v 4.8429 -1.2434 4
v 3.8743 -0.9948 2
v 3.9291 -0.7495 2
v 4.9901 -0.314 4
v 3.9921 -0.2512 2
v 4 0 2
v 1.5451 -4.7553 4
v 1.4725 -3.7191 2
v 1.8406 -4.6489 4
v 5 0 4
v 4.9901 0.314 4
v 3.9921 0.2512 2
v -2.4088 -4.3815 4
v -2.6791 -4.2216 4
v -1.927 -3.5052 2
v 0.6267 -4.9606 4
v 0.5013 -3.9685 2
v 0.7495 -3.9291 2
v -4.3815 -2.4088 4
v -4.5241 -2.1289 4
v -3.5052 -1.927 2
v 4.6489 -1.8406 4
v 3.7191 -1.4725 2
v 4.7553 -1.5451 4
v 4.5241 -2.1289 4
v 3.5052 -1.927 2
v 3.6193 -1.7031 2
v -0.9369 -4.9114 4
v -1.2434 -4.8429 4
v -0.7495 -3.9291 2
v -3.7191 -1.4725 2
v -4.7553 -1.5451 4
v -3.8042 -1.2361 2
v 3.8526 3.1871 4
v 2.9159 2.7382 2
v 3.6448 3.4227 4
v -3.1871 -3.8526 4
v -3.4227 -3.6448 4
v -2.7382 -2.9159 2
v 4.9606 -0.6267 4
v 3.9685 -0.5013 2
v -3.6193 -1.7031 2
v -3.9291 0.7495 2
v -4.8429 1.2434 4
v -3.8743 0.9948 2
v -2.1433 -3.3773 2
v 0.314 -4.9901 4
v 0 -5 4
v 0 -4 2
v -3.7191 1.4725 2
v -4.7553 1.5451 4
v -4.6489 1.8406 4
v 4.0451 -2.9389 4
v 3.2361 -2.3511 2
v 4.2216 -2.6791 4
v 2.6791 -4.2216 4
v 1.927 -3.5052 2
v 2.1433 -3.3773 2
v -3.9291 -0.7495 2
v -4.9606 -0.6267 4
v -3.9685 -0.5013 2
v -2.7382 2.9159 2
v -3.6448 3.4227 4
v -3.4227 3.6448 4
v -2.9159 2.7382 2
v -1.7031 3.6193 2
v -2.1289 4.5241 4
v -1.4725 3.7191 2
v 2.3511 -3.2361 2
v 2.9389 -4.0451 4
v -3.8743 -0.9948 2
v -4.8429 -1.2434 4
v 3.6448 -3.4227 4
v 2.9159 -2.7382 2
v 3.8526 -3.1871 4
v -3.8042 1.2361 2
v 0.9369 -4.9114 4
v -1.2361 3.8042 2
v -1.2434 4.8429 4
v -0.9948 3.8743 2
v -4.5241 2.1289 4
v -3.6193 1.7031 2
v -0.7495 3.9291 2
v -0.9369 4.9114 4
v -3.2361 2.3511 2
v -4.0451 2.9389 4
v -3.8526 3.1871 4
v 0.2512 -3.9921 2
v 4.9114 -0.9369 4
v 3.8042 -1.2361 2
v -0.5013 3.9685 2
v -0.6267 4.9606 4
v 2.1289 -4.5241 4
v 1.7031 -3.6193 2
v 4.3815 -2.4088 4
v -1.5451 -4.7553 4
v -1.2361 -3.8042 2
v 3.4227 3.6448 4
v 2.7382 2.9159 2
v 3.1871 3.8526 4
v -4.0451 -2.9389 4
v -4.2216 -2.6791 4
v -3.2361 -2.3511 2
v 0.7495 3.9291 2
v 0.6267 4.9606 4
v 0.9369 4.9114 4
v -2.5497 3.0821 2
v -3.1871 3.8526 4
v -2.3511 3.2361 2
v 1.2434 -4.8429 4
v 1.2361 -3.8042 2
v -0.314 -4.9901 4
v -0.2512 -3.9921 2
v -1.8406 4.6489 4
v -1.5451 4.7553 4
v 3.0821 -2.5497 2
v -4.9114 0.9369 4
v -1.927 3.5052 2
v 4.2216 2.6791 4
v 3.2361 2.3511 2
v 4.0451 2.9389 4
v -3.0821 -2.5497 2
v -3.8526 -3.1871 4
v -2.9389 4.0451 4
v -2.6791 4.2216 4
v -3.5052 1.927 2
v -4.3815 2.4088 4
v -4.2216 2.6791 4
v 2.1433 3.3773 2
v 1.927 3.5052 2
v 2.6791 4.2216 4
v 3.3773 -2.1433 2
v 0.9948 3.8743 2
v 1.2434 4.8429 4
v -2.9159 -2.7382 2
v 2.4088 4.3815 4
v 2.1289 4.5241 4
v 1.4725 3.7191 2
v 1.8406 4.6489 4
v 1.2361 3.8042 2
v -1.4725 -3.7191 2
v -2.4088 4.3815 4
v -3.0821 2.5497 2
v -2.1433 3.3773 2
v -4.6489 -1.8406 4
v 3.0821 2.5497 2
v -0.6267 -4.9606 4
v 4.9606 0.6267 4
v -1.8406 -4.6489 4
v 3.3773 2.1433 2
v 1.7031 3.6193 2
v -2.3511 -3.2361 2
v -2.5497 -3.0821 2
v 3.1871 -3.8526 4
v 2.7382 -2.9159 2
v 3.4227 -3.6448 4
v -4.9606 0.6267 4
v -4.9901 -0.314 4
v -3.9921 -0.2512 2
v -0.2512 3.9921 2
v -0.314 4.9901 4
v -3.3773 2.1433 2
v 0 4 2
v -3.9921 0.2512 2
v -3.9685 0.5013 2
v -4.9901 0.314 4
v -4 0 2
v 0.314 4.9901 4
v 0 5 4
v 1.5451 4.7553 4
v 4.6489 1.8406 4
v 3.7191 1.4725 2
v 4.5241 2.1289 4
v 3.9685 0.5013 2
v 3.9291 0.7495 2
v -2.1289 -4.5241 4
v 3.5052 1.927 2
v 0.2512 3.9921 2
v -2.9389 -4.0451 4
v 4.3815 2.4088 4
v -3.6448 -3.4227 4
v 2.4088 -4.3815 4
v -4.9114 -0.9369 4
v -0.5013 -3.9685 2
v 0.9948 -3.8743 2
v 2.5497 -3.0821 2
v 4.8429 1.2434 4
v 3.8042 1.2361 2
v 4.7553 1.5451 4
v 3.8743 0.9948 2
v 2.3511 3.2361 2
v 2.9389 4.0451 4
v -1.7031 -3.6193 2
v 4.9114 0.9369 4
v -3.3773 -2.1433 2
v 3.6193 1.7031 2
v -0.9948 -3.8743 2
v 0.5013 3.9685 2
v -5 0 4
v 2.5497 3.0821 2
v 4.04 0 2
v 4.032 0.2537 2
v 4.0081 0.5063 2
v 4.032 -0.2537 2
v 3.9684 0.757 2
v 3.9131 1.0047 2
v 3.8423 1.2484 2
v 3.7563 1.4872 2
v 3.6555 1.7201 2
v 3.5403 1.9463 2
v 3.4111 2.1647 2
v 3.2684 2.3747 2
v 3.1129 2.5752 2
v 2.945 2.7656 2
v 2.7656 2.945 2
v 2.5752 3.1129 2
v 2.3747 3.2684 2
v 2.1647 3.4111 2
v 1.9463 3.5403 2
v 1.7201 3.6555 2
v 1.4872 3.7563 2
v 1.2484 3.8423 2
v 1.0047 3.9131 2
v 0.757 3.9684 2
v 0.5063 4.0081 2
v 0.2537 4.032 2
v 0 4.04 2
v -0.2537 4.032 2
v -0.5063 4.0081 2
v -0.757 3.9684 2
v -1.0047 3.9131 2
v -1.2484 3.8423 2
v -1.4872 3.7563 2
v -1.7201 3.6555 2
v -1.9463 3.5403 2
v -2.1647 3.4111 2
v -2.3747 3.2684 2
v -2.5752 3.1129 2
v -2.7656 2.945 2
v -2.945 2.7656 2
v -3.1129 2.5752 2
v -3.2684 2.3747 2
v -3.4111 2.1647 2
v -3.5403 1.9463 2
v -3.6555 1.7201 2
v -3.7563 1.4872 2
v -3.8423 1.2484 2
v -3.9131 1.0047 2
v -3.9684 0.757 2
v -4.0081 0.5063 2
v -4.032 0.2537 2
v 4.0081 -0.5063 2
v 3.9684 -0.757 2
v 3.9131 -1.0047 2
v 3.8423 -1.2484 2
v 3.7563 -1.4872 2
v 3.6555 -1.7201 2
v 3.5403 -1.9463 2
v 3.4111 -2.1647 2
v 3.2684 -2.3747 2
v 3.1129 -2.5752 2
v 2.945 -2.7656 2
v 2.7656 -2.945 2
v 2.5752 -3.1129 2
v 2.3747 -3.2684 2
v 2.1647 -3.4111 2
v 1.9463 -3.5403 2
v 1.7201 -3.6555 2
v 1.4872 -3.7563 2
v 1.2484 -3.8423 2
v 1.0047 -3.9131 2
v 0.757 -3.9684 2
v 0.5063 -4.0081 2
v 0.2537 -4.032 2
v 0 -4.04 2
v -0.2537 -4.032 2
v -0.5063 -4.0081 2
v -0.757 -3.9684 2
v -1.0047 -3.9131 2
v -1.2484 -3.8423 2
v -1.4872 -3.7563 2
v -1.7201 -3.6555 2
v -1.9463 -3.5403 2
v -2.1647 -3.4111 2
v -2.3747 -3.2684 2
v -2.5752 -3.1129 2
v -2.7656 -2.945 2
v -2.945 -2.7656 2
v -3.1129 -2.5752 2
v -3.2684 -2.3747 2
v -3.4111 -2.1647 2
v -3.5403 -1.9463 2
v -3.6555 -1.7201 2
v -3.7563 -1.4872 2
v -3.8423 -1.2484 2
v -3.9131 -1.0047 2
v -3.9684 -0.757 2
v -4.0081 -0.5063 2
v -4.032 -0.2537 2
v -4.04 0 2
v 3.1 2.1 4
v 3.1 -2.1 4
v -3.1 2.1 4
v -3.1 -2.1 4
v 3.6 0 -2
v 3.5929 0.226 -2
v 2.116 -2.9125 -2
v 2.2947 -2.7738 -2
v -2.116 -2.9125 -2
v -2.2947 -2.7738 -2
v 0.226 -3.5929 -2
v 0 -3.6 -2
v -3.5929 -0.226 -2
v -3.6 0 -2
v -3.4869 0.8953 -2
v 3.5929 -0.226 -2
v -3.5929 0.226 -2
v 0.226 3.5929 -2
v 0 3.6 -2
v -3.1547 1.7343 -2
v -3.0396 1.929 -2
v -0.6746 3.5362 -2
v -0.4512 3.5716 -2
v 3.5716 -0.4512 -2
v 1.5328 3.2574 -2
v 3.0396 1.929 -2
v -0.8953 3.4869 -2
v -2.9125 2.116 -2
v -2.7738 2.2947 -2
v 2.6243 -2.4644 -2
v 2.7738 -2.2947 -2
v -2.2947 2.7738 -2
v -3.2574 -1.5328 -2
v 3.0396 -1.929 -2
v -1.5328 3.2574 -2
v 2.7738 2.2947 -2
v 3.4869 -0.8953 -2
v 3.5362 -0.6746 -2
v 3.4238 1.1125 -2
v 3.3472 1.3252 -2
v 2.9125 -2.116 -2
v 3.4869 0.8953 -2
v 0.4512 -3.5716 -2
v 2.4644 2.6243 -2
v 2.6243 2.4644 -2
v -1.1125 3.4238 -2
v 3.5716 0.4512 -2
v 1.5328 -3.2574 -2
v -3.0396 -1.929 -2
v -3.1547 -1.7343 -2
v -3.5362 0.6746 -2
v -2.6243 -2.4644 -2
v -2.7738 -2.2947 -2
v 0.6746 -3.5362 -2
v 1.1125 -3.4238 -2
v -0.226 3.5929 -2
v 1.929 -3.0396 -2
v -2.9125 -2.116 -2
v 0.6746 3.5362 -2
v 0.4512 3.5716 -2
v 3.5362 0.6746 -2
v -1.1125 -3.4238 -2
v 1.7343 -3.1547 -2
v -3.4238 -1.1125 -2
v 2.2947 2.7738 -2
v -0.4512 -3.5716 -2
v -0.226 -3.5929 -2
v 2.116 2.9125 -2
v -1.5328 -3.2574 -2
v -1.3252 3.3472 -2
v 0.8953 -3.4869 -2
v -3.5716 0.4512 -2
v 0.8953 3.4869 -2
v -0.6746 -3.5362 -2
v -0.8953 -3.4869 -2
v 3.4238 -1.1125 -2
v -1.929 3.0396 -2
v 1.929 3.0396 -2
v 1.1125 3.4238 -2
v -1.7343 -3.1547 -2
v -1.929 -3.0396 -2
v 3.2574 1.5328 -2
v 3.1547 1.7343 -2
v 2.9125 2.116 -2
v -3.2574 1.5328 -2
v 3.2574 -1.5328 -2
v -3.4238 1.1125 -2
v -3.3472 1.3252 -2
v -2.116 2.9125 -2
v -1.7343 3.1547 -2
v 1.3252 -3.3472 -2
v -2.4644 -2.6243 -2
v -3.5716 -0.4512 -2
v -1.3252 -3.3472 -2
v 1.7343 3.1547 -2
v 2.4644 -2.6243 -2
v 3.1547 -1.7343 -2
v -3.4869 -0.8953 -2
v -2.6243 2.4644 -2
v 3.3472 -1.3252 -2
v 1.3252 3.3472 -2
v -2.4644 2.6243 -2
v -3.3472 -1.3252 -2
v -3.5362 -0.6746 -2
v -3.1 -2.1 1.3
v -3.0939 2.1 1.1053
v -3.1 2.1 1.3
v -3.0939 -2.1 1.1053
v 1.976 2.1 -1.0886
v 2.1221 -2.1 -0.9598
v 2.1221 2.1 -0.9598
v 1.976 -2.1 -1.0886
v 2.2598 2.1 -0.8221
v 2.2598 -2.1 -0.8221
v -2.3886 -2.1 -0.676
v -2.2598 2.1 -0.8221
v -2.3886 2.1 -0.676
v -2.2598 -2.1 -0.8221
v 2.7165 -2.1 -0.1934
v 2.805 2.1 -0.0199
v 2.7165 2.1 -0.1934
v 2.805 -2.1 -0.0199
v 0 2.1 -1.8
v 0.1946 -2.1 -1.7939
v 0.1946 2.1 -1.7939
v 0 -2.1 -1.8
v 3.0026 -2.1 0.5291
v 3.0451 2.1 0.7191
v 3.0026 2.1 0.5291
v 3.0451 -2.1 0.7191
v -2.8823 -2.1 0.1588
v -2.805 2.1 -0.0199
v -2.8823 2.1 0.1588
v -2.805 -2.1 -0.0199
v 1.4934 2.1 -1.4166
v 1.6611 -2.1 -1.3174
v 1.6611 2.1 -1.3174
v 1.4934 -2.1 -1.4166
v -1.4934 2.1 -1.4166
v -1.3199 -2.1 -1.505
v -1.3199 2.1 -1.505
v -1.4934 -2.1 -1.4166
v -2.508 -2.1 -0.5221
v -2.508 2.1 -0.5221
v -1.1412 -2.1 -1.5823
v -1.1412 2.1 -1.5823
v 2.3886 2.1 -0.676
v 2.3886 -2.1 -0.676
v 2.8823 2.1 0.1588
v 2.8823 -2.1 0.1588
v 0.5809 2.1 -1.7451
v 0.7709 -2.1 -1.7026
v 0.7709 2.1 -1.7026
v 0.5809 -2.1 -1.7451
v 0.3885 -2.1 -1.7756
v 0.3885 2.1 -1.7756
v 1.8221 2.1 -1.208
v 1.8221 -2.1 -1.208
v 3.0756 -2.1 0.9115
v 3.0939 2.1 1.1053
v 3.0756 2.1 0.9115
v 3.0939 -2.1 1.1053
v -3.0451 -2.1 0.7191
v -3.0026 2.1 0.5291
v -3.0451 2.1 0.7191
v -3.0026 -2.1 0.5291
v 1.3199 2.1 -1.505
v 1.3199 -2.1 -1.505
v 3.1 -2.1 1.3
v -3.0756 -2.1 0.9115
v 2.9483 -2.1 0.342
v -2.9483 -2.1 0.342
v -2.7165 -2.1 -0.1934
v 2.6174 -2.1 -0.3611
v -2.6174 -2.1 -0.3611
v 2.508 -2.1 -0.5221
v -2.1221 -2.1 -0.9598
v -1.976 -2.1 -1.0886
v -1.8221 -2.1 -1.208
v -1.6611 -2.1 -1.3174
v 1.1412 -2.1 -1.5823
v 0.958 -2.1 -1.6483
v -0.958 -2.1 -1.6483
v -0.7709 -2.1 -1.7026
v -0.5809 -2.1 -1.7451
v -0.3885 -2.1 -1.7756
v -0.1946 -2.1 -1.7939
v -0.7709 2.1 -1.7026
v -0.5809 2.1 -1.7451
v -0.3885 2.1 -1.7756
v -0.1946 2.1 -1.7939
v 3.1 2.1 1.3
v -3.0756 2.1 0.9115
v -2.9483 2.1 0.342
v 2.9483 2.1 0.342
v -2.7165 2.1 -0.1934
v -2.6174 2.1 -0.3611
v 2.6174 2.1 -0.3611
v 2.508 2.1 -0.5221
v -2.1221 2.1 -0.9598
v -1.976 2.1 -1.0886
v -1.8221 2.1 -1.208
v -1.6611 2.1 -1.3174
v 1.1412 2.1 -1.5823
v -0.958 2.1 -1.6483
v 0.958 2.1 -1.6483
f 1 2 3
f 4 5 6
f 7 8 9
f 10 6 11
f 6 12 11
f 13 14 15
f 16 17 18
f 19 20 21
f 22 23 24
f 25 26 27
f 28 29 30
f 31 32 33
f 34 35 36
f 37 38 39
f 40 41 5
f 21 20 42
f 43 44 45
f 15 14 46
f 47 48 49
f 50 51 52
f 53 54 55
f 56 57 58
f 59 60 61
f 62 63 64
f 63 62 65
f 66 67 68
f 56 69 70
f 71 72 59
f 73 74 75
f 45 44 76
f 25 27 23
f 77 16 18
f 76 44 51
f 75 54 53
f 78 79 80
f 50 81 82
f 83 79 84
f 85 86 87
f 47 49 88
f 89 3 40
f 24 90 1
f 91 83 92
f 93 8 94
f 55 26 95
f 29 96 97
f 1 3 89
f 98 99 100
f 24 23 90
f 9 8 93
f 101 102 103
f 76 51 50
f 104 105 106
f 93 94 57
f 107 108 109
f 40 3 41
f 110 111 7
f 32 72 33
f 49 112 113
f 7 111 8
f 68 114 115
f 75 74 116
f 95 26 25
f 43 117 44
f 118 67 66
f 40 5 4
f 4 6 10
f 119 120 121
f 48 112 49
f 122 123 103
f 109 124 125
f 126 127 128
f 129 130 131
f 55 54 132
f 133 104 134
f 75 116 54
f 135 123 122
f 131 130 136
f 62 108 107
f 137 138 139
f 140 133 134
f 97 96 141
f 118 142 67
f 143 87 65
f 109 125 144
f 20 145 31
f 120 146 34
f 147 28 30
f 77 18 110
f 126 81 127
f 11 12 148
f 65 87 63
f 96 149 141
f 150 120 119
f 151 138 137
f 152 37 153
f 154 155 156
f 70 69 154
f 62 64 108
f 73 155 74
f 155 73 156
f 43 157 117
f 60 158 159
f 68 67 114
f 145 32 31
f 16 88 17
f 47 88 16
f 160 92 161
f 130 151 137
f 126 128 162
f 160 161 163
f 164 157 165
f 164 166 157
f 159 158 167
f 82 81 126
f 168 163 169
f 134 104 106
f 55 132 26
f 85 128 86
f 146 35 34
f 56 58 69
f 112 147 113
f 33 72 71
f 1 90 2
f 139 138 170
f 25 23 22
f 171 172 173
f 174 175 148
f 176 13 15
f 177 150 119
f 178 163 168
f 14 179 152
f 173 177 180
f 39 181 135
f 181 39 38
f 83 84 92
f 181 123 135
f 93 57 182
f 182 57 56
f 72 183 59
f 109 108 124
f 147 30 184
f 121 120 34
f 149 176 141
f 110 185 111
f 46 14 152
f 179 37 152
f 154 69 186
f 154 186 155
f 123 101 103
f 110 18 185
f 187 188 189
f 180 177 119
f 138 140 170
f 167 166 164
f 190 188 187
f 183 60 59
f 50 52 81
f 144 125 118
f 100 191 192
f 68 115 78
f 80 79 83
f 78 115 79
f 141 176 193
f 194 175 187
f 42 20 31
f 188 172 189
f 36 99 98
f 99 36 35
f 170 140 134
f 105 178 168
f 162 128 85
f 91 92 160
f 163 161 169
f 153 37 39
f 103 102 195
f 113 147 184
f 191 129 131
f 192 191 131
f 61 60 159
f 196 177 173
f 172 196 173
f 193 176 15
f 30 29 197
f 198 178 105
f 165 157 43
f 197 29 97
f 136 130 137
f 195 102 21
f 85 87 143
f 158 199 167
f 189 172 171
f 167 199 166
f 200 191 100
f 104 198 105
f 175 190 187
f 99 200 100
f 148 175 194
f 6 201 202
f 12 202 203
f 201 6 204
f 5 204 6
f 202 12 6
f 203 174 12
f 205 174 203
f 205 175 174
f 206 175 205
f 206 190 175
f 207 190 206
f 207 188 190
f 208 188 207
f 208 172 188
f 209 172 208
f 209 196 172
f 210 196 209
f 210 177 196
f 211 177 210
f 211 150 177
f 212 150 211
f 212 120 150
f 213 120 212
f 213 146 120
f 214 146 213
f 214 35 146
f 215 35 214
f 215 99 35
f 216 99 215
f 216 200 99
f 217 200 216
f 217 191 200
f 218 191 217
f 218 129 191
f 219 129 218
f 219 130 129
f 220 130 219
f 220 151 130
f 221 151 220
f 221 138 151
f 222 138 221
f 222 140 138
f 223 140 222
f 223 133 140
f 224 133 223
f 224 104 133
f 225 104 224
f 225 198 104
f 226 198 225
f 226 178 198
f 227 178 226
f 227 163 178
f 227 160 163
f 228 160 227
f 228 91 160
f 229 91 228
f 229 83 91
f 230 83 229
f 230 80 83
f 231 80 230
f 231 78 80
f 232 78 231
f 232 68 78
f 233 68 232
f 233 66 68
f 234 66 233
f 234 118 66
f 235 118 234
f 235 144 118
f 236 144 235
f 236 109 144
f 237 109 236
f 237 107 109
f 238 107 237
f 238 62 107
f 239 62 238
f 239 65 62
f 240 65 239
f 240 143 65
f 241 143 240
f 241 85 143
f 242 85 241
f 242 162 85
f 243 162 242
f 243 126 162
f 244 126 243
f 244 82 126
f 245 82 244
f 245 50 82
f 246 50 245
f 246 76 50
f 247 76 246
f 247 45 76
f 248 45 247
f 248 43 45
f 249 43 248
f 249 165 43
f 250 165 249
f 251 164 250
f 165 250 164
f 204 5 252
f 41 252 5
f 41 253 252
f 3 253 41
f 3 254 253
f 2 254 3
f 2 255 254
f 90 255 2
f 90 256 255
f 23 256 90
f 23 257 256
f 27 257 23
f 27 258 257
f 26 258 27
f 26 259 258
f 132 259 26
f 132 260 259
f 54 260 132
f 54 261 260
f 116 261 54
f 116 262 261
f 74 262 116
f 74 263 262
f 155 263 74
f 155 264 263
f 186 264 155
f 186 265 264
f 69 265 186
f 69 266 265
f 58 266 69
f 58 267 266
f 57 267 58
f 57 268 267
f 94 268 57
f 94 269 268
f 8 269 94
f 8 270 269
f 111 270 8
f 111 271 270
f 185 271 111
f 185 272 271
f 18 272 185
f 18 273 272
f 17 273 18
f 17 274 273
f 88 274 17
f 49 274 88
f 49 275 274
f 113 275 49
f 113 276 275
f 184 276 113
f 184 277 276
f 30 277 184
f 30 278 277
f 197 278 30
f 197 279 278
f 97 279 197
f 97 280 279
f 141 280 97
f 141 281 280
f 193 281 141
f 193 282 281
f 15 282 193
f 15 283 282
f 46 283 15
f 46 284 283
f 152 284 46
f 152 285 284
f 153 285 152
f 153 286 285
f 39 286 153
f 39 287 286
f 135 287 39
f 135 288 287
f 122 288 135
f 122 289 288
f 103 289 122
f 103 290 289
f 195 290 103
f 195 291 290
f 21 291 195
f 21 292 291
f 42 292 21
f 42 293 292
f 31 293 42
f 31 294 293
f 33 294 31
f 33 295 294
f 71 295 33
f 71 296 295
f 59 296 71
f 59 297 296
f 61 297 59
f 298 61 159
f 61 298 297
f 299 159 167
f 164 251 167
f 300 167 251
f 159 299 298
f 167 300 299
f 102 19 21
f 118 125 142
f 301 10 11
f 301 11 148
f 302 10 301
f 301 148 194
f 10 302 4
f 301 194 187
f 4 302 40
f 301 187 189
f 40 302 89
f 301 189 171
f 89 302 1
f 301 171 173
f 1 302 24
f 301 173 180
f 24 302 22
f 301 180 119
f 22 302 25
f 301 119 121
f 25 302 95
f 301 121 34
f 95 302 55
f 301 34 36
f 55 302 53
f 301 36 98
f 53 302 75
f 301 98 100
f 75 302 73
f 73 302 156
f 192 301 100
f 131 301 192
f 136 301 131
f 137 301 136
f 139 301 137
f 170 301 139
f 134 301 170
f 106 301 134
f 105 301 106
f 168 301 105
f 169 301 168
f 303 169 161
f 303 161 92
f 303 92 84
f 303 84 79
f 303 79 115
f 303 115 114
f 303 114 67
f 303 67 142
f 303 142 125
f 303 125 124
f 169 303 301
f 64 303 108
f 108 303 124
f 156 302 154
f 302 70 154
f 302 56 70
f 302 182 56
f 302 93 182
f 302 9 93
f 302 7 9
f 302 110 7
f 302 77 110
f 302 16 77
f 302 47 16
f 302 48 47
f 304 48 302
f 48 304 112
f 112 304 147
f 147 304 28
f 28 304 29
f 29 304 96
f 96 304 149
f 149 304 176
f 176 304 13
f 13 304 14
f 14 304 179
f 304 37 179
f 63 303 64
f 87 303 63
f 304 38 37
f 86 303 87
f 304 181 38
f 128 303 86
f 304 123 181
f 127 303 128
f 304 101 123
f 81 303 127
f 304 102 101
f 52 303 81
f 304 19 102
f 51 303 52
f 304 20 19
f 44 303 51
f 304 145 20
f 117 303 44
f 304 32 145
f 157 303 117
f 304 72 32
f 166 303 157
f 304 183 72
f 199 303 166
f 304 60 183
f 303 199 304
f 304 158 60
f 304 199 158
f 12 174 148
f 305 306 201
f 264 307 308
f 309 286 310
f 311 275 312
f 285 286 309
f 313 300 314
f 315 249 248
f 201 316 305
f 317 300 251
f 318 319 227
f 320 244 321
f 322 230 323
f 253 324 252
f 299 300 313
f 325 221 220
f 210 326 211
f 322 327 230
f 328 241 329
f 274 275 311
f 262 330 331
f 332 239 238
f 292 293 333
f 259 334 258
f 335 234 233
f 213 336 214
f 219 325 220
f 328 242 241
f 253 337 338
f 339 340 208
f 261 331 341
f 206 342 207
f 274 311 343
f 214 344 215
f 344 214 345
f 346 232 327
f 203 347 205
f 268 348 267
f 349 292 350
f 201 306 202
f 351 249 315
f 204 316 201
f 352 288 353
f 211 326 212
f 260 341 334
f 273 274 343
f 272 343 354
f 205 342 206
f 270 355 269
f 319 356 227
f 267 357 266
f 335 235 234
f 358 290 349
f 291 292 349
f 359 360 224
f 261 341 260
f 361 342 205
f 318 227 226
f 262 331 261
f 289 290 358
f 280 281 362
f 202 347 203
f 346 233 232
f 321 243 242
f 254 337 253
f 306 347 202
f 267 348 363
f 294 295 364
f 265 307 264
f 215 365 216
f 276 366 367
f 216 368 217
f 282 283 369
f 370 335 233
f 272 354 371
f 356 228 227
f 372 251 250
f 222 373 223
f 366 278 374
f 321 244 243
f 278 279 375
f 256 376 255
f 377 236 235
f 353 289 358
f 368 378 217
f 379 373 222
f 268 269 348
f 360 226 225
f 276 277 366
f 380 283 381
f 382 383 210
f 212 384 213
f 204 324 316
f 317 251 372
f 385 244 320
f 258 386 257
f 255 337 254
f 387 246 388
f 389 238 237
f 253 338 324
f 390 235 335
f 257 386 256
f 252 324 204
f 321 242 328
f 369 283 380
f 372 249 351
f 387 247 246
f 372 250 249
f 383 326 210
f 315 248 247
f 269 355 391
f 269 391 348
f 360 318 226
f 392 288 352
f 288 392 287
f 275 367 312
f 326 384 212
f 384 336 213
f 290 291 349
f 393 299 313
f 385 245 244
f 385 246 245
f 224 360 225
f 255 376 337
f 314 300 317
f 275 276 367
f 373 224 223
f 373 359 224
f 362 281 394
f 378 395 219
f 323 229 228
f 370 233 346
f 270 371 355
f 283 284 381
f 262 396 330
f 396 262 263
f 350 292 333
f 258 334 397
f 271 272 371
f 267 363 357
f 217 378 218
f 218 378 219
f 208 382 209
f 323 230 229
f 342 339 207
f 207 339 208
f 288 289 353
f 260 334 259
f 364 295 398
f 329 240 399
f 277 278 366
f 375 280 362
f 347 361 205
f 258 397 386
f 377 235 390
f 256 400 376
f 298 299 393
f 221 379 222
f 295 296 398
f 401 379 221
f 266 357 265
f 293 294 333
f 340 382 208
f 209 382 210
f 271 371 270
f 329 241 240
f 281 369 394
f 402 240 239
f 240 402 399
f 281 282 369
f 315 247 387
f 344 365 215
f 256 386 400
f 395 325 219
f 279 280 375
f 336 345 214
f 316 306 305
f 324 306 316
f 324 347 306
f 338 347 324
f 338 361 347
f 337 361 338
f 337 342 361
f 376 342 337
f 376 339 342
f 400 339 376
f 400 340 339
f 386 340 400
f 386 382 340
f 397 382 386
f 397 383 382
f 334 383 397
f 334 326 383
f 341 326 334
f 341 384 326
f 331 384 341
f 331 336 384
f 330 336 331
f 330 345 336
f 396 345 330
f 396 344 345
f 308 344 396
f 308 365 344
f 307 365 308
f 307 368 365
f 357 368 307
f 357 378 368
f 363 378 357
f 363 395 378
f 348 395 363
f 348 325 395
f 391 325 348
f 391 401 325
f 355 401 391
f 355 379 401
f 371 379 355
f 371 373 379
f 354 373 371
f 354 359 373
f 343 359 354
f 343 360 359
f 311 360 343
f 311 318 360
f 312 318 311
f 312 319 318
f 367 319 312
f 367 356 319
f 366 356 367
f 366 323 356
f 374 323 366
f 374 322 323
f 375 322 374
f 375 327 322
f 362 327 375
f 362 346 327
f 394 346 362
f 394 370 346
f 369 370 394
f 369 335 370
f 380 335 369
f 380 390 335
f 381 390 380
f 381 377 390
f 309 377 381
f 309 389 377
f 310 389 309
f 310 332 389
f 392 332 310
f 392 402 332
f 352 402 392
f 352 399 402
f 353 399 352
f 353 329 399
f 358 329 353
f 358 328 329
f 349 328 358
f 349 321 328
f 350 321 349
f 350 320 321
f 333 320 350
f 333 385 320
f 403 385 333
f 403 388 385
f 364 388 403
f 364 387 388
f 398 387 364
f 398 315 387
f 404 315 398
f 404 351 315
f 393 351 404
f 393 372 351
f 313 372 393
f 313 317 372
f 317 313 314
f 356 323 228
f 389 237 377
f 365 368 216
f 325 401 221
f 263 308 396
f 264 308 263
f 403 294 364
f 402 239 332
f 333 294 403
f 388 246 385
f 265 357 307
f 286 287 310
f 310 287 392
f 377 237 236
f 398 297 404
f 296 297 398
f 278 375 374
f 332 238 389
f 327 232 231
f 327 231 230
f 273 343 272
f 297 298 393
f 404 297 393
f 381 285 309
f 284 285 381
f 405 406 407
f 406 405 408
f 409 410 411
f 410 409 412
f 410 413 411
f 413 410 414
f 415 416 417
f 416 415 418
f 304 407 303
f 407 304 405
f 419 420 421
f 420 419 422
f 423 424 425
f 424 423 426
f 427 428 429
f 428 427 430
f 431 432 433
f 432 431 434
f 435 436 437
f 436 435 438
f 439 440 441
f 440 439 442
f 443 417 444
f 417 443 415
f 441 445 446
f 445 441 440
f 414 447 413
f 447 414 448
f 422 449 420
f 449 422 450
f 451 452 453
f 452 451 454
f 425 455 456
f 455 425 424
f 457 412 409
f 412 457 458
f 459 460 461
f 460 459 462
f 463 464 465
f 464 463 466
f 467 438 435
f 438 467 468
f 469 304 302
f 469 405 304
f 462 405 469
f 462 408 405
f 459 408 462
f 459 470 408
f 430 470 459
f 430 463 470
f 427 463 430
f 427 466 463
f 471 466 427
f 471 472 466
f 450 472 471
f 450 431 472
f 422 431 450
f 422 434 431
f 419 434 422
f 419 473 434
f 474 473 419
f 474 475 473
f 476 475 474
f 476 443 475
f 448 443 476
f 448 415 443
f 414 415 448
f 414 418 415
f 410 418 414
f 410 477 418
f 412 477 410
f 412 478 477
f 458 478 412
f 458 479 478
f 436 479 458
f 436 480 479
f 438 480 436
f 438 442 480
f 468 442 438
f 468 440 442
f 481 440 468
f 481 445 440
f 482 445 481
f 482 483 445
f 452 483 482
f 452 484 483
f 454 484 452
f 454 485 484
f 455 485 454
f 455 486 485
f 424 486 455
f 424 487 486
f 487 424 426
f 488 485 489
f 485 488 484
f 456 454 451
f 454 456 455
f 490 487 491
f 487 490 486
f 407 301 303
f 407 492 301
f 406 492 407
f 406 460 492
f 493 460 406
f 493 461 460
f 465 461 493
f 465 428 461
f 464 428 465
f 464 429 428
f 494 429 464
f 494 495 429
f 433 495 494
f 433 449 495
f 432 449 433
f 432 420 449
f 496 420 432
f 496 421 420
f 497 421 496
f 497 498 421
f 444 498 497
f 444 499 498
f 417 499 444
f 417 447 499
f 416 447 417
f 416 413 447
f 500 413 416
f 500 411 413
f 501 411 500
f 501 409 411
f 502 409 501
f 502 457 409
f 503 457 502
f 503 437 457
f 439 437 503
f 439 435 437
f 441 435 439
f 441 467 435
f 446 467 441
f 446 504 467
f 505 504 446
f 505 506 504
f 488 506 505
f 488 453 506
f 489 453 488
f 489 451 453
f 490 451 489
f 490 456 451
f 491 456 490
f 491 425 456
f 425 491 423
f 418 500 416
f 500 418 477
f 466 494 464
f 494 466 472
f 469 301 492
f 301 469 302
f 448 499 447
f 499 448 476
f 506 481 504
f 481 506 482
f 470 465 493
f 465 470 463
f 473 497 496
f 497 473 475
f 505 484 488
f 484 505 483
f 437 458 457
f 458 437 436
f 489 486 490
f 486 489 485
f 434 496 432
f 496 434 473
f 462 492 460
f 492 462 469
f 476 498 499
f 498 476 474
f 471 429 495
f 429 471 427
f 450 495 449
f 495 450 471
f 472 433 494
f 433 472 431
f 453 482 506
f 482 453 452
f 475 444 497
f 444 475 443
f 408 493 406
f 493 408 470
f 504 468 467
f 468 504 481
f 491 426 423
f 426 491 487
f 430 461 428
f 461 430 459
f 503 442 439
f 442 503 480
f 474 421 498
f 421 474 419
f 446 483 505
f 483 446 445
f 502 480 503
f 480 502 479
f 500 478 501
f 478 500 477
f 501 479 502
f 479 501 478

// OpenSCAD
//defining some constant
magnet_radius = 3.1;
magnet_height = 4.2;
rod_radius = 4;
base_height_1 = 4;
base_height_2 = 2;
fac = 0.5; //45 deg inclination: easy for printing

module magnet(){
    cylinder(h = magnet_height, r = magnet_radius, center = true, $fn = 100);
}

module base(){
    union(){
        translate([0, 0, 0.5 * (base_height_1 + base_height_2)])
        cylinder(h = base_height_2, r1 = rod_radius, r2 = rod_radius + fac * base_height_2, center = true, $fn = 100);
        cylinder(h = base_height_1, r1 = 0.9 * rod_radius, r2 = 1.01 * rod_radius, center = true, $fn = 100);
    }
}

module holder_vertical(magnet_displacement){
difference(){
    base();
    #hull(){
        translate([0, 0, magnet_radius + magnet_displacement])
        rotate([90, 0, 0])
        magnet();
        translate([0, 0, magnet_displacement])
        rotate([90, 0, 0])
        magnet();
    }
}   
}
module holder_horizontal(magnet_displacement){
difference(){
    base();
    #hull(){
        translate([0, 0, magnet_radius + magnet_displacement])
        magnet();
        translate([0, 0, magnet_displacement])
        magnet();
    }
}   
}


holder_vertical(1.3);
//translate([15, 0, 0])
//holder_vertical(1.7);
//translate([0, 15, 0])
//holder_horizontal(1.3);
//translate([15, 15, 0])
//holder_horizontal(1.7);
